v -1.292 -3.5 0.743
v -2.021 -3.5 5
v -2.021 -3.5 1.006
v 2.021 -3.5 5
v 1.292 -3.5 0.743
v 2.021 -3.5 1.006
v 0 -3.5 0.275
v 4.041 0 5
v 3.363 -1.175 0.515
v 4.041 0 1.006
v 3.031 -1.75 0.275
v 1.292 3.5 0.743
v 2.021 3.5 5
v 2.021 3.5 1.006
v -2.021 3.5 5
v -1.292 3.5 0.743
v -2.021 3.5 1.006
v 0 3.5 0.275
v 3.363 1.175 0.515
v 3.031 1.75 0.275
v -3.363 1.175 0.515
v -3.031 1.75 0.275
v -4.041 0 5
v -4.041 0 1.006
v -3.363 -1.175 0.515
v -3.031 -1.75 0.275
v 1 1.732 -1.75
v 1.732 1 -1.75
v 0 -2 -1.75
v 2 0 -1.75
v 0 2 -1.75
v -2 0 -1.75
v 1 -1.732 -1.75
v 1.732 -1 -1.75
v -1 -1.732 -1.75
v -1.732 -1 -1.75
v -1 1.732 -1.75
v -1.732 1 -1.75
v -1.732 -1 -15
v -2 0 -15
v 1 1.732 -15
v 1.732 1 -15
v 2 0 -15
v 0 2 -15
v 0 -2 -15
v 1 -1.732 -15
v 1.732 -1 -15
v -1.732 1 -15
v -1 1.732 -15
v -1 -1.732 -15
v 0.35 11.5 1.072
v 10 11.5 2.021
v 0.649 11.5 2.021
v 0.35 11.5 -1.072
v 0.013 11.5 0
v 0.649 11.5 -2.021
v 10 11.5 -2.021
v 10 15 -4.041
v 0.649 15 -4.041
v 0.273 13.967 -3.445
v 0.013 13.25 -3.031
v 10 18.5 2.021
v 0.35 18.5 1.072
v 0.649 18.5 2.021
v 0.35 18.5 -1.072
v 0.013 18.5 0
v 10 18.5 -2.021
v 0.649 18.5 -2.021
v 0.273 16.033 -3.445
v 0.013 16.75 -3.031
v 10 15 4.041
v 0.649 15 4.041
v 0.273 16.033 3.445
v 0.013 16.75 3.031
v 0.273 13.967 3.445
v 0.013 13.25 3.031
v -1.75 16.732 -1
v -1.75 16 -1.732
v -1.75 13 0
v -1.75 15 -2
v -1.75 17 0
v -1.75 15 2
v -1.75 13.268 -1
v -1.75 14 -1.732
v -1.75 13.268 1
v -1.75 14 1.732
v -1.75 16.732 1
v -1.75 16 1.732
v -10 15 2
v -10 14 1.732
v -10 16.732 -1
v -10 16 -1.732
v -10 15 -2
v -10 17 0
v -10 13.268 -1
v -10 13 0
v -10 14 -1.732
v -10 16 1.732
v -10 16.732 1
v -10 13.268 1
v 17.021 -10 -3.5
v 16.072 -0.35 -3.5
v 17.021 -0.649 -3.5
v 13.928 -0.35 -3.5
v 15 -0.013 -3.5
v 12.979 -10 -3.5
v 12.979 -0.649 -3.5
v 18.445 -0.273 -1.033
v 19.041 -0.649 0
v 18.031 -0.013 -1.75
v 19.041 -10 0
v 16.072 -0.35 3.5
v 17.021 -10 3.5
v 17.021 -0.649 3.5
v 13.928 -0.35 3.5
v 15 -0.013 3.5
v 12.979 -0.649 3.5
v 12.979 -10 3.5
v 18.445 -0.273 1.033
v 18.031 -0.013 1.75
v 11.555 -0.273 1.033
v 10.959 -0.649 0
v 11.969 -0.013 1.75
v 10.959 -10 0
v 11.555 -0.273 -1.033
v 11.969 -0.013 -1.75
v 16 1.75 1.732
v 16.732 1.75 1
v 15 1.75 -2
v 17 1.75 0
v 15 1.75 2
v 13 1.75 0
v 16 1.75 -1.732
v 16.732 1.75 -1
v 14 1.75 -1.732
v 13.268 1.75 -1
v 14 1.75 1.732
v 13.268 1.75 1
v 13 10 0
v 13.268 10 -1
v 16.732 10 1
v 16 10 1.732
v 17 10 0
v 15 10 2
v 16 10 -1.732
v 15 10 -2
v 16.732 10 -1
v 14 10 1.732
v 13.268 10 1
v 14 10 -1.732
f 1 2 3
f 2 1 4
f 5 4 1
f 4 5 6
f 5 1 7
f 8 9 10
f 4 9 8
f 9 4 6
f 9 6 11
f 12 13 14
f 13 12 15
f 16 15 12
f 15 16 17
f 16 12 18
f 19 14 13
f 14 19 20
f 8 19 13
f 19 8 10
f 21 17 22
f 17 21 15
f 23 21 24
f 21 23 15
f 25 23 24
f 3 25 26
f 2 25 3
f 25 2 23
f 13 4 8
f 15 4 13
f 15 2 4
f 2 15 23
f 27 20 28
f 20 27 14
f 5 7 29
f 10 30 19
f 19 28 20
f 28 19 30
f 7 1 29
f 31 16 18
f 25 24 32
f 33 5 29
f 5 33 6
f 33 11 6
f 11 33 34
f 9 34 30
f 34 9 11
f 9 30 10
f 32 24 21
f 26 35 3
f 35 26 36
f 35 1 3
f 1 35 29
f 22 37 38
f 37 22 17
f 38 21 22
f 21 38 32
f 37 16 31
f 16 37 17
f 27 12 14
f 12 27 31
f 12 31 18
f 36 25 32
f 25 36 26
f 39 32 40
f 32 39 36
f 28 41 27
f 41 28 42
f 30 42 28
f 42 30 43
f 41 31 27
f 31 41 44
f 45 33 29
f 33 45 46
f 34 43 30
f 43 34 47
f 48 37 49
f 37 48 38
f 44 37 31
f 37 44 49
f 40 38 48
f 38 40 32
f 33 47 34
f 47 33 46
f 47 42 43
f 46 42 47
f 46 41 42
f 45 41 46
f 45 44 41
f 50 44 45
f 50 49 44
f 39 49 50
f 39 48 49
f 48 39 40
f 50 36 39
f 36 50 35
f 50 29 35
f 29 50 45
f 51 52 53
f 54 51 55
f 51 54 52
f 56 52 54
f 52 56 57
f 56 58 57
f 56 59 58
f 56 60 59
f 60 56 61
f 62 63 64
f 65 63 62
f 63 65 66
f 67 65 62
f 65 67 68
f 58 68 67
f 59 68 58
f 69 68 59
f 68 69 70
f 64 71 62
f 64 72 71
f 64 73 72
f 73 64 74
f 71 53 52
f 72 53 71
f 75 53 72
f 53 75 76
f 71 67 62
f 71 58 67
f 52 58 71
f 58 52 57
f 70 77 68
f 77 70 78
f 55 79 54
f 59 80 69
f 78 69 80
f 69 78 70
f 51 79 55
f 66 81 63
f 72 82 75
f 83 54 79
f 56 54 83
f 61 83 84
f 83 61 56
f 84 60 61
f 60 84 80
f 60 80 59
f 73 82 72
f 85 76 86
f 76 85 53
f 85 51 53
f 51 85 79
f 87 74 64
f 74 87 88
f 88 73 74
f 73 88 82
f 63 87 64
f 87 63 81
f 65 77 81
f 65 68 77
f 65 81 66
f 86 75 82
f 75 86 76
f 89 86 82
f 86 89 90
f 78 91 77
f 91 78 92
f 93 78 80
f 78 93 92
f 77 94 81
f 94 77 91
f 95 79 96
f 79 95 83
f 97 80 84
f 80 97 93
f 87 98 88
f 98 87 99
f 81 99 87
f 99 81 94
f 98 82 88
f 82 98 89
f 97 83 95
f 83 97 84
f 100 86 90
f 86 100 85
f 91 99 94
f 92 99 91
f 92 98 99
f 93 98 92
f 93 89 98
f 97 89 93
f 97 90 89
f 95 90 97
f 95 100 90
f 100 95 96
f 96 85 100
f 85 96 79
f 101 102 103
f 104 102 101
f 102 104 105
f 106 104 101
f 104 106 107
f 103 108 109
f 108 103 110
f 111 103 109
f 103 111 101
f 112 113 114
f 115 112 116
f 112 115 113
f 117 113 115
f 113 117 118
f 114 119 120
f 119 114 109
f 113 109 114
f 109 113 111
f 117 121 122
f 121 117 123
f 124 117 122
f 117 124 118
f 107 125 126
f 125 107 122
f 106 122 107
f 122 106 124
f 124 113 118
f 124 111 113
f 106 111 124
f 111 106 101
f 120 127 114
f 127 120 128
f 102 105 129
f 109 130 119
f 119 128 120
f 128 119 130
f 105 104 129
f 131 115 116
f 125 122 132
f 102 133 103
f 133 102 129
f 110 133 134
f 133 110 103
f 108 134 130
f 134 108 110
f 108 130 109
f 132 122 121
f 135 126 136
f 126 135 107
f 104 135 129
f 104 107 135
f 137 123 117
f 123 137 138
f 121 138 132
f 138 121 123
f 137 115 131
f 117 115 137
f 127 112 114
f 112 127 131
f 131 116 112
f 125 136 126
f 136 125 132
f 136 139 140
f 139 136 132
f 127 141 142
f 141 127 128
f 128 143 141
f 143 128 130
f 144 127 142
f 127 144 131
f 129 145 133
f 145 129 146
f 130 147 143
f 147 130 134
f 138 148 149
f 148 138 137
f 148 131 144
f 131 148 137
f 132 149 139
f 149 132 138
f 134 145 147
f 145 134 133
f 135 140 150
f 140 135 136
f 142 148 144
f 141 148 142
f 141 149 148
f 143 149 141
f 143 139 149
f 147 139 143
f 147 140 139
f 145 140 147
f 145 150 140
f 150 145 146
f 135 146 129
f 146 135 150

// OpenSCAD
// Vertical nut recess with base of nut centred on origin 
//
// Includes countersing at base of nut for downward-facing print
//
// af = nut size accross faces
// oh = overall height (screw + head + recesss)
// sd = screw diameter
// sh = screw height (to shoulder of nut recess)
//
module nutrecessZcs(af, oh, sd, sh)
{
  sin60 = sin(60);
  union()
  {
    // % translate([0,0,oh-sh]) cylinder(r=af/sin60/2, h=5, $fn=12);
    // Square shoulder...
    //cylinder(r=af/sin60/2, h=oh-sh, $fn=6);
    // Angle shoulder at 45deg for printing...
    intersection()
    {
        translate([0,0,-sh]) cylinder(r=af/sin60/2, h=oh, $fn=6);
        translate([0,0,-af/4])
          cylinder(r1=sd/2, r2=sd/2+(oh-sh), h=oh-sh+af/4, $fn=12);
    }
    translate([0,0,-sh]) cylinder(r=sd/2, h=oh, $fn=12);
  }
}

// Nut recess with screw directed along negative X-axis
module nutrecessXcs(od, oh, sd, sh)
{
    rotate([0,90,0]) nutrecessZcs(od, oh, sd, sh);
}

// Nut recess with screw directed along negative Y-axis
module nutrecessYcs(od, oh, sd, sh)
{
    rotate([90,0,0]) nutrecessZcs(od, oh, sd, sh);
}


// Examples
nutrecessZcs(7, 20, 4, 15);

translate([0,15,0]) nutrecessXcs(7, 20, 4, 10);

translate([15,0,0]) nutrecessYcs(7, 20, 4, 10);
